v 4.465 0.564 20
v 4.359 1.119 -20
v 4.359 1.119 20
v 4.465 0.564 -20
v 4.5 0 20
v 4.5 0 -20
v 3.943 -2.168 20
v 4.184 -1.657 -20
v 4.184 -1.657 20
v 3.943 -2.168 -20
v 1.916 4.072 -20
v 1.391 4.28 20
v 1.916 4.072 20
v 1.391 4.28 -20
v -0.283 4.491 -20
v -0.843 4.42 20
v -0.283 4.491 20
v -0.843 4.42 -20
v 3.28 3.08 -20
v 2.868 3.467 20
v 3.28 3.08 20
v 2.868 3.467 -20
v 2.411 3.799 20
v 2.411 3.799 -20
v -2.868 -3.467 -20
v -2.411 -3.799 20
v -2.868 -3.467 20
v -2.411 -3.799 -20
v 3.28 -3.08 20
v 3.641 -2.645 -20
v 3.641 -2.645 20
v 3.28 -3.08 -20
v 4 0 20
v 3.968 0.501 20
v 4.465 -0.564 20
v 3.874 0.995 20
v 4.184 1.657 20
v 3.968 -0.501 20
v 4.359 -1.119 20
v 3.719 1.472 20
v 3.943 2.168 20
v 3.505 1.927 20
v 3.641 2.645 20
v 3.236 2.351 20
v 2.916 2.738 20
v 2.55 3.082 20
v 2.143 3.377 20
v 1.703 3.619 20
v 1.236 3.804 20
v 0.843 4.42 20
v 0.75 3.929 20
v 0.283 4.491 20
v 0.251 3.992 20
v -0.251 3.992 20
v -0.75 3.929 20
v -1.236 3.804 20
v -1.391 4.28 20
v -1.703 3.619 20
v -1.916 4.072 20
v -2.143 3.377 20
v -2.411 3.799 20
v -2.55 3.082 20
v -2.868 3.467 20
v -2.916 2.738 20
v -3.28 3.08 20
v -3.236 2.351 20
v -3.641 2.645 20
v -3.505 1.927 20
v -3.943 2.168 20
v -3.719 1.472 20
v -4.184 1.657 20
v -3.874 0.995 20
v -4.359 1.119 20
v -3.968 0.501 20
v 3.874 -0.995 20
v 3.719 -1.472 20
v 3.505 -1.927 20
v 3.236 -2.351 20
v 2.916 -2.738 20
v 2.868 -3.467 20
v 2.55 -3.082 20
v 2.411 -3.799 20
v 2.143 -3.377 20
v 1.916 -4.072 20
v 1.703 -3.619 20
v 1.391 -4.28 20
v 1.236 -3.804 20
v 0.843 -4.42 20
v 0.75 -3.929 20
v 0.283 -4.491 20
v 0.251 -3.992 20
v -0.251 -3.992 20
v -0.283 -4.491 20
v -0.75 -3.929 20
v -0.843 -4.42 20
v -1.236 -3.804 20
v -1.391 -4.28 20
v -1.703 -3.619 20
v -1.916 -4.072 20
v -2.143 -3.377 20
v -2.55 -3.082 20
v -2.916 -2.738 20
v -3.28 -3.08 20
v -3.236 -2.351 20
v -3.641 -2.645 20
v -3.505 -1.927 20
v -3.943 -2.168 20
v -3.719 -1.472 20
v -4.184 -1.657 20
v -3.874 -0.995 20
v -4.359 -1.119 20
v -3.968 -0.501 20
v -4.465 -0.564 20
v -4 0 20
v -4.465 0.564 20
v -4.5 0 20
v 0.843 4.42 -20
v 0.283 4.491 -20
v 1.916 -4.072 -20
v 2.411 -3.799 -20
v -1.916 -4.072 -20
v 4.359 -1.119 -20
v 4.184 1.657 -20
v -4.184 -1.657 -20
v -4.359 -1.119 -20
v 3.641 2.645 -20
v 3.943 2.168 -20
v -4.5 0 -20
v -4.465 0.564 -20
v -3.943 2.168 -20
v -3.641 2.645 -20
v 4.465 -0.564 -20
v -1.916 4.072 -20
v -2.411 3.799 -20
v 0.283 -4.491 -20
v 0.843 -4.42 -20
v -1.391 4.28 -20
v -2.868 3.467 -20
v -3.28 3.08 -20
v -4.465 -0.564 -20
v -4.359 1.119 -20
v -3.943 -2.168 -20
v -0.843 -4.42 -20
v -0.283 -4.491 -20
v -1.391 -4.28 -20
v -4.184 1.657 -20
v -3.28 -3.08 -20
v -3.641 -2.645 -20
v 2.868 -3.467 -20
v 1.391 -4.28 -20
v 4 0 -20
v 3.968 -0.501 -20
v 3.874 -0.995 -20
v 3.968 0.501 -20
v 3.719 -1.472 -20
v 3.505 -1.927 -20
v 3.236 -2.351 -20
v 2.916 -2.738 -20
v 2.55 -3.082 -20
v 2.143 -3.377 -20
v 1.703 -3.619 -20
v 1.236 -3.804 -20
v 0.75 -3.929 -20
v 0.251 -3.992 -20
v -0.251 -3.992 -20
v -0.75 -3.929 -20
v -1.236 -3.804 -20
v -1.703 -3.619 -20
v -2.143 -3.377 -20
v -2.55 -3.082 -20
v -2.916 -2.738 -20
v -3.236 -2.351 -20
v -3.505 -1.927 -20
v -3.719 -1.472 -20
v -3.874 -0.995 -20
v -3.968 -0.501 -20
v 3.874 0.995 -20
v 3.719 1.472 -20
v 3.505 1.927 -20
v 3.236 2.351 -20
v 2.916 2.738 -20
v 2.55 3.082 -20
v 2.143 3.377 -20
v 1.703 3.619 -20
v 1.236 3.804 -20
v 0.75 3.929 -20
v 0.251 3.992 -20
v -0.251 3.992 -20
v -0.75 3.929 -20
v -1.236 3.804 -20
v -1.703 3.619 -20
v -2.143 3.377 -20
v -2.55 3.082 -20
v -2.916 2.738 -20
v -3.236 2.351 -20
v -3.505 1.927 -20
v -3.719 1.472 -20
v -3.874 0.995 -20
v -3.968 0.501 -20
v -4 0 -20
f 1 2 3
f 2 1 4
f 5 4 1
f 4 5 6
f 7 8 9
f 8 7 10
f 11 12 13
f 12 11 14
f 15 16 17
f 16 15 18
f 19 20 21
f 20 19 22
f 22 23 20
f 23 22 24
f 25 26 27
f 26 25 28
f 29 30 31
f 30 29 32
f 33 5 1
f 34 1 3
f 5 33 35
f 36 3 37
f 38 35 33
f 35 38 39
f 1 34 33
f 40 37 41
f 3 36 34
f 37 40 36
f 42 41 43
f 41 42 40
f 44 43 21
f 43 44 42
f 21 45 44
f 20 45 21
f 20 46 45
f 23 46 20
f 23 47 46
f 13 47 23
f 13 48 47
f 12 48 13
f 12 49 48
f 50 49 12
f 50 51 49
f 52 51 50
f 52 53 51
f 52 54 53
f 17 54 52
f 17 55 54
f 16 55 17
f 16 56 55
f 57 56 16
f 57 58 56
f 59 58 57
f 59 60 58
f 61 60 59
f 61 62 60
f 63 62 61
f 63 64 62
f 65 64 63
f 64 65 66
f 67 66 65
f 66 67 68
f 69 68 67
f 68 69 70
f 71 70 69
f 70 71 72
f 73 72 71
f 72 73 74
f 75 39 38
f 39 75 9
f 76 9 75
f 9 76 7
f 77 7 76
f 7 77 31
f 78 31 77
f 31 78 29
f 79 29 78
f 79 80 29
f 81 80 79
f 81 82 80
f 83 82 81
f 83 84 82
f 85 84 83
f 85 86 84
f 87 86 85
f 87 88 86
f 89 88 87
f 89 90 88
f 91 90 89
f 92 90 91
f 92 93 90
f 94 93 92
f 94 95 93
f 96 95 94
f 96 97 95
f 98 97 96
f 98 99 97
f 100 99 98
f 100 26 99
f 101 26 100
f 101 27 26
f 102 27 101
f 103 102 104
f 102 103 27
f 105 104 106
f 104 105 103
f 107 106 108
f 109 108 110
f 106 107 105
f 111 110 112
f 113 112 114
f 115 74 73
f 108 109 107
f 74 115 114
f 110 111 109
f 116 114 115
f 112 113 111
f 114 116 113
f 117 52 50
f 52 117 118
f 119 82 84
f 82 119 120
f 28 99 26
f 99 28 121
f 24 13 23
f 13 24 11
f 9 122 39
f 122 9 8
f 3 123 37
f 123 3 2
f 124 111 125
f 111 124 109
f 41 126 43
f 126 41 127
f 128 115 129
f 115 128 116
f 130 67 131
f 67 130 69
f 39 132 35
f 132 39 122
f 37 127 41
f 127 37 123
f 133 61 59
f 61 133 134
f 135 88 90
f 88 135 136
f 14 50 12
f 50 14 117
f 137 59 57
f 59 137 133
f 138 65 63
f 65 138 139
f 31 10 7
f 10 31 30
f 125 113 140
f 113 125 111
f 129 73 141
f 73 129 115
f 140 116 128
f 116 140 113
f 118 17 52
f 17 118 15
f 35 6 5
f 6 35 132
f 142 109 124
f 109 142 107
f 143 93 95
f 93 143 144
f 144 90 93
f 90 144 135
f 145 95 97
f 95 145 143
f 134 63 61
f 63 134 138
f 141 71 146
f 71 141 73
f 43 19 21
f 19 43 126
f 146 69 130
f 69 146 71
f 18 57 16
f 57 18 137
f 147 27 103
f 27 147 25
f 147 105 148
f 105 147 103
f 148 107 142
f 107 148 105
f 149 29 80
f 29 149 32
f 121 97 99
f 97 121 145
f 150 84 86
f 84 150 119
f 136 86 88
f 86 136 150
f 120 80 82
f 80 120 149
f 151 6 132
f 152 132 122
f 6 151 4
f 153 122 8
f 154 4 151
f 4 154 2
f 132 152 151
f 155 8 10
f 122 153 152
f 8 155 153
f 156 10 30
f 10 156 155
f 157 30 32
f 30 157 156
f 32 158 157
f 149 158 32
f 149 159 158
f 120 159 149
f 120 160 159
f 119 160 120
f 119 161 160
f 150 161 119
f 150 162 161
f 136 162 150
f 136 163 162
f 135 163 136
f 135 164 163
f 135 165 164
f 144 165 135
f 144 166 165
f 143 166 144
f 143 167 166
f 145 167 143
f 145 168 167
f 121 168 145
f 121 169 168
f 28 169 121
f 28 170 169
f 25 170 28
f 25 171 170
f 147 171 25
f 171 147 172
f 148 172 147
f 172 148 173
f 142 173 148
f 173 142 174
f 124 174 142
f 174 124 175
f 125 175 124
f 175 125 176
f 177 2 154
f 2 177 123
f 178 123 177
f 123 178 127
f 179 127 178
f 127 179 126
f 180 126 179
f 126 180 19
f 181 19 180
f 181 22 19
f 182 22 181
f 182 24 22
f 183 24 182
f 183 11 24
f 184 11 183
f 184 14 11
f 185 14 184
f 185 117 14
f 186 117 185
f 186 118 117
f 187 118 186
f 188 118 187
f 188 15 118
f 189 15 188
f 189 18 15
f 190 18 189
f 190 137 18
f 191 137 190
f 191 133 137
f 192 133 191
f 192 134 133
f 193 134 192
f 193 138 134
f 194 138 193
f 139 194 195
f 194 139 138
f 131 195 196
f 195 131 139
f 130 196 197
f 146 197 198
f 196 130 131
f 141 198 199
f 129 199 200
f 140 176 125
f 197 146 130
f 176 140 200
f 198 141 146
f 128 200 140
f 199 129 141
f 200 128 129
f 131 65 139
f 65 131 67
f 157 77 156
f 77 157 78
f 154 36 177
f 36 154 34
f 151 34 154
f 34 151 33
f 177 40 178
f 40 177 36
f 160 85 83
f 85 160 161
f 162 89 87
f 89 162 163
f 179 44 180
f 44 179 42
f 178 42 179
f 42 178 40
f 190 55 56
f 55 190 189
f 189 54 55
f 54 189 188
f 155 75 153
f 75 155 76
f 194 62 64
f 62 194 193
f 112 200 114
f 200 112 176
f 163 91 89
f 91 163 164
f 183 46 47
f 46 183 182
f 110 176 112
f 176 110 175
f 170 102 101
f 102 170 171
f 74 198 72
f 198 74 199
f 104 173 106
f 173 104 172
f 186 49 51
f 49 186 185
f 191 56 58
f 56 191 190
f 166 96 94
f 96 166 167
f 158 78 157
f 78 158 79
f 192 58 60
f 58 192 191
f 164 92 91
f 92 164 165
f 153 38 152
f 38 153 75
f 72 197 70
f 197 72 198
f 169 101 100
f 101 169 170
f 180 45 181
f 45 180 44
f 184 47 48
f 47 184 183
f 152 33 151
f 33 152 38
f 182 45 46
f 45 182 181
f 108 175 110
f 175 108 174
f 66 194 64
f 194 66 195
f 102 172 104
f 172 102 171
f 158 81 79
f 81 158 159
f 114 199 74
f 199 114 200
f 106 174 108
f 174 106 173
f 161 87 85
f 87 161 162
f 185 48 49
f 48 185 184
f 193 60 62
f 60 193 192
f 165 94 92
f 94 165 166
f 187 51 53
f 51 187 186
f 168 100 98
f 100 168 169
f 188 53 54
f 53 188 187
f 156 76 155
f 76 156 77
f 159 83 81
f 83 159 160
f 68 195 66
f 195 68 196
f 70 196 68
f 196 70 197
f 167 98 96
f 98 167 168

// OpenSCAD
$fn = 50;


difference() {
	union() {
		translate(v = [0, 0, -20.0000000000]) {
			cylinder(h = 40, r = 4.5000000000);
		}
	}
	union() {
		translate(v = [0, 0, -100.0000000000]) {
			cylinder(h = 200, r = 4.0000000000);
		}
	}
}
